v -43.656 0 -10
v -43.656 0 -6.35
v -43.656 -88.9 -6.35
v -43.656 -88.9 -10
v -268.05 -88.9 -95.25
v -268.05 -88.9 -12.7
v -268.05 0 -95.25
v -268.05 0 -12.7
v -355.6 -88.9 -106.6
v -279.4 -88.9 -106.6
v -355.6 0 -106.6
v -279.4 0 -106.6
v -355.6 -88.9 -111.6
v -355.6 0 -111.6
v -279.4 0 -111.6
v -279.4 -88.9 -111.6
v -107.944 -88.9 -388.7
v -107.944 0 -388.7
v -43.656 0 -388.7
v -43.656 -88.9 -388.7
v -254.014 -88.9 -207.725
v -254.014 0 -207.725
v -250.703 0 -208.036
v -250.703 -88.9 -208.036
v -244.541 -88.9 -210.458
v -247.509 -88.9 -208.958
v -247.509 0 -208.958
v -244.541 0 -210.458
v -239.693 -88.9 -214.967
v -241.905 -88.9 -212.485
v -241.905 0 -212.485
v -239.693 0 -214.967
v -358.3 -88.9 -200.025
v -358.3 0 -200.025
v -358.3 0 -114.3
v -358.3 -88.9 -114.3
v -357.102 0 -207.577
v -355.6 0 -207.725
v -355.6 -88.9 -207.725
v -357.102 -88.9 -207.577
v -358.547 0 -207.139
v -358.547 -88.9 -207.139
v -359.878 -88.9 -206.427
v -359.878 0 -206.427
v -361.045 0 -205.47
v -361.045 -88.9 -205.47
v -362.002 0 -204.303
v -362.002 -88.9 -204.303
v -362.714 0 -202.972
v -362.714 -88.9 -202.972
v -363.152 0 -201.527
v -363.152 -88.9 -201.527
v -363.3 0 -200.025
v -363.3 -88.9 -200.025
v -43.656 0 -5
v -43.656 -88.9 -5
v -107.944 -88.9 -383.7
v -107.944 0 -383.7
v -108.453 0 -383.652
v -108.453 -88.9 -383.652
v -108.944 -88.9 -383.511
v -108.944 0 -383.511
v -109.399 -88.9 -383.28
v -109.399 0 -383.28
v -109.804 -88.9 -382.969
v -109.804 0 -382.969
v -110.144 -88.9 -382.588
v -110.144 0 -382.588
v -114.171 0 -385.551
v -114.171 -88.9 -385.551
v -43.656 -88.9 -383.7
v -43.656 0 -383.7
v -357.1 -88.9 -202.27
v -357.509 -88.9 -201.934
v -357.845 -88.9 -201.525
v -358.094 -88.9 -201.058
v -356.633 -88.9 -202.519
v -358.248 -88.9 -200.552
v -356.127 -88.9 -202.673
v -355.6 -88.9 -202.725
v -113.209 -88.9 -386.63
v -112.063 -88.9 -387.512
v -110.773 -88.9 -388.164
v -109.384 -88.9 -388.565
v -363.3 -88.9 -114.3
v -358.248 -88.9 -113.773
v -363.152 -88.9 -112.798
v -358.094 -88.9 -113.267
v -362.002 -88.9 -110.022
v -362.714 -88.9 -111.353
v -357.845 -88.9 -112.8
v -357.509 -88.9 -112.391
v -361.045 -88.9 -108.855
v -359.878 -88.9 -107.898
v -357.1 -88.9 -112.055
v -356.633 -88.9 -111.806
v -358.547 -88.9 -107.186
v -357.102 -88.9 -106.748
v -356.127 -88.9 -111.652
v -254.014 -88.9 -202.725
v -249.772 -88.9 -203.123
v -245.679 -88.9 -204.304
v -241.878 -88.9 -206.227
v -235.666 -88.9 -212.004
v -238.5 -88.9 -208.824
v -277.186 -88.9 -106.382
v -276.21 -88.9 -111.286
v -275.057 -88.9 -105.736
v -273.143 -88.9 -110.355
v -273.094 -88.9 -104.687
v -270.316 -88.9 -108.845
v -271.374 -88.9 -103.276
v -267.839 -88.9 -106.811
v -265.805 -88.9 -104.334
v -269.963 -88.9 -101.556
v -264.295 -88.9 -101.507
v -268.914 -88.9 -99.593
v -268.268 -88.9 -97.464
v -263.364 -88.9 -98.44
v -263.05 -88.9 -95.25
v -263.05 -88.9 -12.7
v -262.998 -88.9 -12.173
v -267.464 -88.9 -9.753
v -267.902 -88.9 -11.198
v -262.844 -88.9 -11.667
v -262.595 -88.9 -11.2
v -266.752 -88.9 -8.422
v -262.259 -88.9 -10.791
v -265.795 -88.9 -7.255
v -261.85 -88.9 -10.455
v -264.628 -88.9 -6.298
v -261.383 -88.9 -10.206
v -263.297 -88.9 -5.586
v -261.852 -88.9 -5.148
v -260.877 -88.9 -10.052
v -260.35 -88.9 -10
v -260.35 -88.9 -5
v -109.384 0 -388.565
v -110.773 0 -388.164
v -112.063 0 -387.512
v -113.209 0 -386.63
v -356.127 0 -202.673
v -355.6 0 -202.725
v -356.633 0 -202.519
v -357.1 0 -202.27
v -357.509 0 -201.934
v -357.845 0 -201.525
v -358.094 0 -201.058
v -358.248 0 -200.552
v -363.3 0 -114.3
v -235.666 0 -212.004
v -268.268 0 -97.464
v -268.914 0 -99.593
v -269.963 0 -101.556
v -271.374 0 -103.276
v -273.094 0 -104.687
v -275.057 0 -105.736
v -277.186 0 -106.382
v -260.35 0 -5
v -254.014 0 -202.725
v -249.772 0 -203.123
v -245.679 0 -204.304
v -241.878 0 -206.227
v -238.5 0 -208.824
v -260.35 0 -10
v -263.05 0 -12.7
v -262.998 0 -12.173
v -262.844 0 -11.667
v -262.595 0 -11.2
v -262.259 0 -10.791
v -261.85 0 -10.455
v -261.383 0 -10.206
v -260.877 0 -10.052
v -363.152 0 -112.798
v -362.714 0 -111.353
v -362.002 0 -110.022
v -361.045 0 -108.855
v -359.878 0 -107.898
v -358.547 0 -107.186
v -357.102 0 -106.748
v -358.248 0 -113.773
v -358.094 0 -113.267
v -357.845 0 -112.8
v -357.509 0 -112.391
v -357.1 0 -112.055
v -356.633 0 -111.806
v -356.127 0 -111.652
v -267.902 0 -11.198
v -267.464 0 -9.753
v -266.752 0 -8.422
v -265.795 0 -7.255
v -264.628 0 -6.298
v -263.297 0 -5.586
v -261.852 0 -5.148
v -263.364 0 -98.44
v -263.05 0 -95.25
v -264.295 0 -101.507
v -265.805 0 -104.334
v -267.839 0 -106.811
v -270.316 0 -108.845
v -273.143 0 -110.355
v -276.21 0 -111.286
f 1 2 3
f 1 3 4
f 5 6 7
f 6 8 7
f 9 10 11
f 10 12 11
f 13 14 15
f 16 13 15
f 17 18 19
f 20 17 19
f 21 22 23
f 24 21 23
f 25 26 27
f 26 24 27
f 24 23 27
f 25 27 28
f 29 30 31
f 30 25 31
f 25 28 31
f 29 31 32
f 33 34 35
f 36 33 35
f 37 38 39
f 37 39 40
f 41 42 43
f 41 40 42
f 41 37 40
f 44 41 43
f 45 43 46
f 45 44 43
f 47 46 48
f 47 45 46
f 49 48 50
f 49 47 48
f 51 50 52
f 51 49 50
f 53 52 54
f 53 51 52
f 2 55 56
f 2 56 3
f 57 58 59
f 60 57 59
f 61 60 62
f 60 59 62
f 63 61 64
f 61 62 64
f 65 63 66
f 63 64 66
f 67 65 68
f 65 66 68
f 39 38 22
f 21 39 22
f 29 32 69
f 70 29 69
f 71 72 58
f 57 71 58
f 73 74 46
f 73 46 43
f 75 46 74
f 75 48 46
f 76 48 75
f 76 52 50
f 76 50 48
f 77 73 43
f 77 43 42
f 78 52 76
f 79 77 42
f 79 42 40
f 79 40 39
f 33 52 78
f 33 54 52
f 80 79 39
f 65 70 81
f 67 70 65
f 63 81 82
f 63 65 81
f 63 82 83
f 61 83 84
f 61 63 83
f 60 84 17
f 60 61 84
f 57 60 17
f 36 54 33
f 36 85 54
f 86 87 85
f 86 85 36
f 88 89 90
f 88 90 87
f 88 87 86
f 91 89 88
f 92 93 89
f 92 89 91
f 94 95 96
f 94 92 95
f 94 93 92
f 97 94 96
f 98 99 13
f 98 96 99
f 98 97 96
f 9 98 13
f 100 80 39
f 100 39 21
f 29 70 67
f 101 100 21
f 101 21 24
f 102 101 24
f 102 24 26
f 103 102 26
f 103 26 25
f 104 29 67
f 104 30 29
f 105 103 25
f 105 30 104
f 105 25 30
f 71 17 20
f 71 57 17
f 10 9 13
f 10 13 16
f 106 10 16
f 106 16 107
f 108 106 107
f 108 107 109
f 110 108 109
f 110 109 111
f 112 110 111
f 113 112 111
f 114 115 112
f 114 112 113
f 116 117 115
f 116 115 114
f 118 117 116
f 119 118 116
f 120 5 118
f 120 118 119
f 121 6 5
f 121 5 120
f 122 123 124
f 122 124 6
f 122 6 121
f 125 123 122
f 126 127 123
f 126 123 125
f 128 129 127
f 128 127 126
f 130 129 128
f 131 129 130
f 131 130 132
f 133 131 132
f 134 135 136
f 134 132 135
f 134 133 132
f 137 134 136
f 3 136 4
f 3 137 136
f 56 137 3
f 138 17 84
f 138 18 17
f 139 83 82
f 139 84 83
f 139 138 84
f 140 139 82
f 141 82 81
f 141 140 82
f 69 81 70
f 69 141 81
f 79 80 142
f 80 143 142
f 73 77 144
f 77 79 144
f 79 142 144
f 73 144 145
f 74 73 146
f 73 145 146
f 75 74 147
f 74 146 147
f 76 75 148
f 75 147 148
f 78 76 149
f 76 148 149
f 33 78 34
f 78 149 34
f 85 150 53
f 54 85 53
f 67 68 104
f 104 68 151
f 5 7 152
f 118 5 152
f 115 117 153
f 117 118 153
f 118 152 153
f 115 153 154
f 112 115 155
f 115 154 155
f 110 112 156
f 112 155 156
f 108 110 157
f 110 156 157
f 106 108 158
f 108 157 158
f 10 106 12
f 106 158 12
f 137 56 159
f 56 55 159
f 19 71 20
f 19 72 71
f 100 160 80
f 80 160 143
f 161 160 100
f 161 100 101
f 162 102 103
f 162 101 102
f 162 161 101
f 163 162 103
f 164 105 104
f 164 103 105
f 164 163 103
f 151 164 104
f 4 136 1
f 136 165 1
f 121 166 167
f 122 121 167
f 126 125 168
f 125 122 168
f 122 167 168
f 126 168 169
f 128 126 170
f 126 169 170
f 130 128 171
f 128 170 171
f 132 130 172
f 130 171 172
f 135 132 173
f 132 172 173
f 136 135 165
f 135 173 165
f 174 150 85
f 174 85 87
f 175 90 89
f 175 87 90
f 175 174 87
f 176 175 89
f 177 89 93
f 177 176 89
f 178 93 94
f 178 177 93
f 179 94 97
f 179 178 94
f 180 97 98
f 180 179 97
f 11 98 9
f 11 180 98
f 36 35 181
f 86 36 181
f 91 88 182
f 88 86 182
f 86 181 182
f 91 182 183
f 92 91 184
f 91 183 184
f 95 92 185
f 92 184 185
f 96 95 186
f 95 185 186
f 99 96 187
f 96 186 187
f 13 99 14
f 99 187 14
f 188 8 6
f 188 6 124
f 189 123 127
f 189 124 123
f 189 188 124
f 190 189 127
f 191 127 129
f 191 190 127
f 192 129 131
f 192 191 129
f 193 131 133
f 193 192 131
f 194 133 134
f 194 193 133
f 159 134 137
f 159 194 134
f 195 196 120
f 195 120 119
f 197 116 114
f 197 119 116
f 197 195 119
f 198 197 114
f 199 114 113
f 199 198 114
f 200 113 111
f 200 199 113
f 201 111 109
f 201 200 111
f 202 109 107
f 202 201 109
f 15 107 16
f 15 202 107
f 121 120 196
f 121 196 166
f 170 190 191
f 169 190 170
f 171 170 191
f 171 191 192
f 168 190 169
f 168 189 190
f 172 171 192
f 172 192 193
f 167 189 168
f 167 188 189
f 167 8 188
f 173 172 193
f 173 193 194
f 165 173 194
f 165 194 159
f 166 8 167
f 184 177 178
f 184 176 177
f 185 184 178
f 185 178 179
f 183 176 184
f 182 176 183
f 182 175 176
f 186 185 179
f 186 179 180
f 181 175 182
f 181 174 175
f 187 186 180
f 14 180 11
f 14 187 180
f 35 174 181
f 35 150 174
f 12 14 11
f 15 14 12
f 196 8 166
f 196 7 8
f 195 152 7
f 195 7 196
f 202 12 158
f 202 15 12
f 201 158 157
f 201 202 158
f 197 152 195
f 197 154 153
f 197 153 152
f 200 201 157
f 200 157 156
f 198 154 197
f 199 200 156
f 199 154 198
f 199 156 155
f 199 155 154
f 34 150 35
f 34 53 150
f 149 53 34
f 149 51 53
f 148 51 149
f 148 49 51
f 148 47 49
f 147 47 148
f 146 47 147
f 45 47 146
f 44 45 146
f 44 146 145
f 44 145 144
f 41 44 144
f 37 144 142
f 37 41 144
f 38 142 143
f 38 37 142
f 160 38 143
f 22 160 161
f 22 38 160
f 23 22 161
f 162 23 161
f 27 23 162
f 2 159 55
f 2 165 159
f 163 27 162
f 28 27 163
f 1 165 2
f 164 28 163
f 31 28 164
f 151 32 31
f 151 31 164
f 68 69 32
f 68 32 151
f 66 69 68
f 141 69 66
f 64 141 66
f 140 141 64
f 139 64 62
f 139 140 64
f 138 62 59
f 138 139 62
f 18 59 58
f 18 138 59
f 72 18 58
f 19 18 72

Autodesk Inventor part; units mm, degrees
ref_plane "YZ Plane" through (0, 0, 0) normal (1, 0, 0) x (0, 1, 0)
ref_plane "XZ Plane" through (0, 0, 0) normal (0, 1, 0) x (-1, 0, 0)
ref_plane "XY Plane" through (0, 0, 0) normal (0, 0, 1) x (1, 0, 0)
sketch "Boceto1" plane through (0, 0, 0) normal (0, 1, 0) x (-1, 0, 0)
  line L0 (0, 0) -> (273.05, 0)
  line L1 (273.05, 0) -> (273.05, -101.6)
  line L2 (273.05, -101.6) -> (368.3, -101.6)
  line L3 (368.3, -101.6) -> (368.3, -212.725)
  line L4 (0, 0) -> (0, -393.7)
  line L5 (0, -393.7) -> (114.3, -393.7)
  line L6 (368.3, -212.725) -> (247.65, -212.725)
  line L7 (247.65, -212.725) -> (114.3, -393.7)
  dimension "d0" = 273.05
  dimension "d1" = 101.6
  dimension "d2" = 95.25
  dimension "d3" = 111.125
  dimension "d4" = 393.7
  dimension "d50" = 114.3
  dimension "d51" = 133.35
extrude "Extrusión1" add sketch "Boceto1" along normal blind 5
fillet "Empalme1" radius 12.7 7 edges at (-368.3, 2.5, -101.6) (-273.05, 2.5, 0) (-368.3, 2.5, -212.725) (-247.65, 2.5, -212.725) (-114.3, 2.5, -393.7) (0, 2.5, -393.7) (0, 2.5, 0)
fillet "Empalme2" radius 6.35 1 edges at (-273.05, 2.5, -101.6)
sketch "Boceto2" plane through (0, 5, 0) normal (0, 1, 0) x (1, 0, 0)
  line L0 (-349.25, 119.0625) -> (-273.05, 119.0625)
  line L1 (-273.05, 119.0625) -> (-273.05, 195.2625)
  line L2 (-273.05, 195.2625) -> (-349.25, 195.2625)
  line L3 (-349.25, 195.2625) -> (-349.25, 119.0625)
  line L4 (-368.3, 200.025) -> (-368.3, 114.3) projected
  line L5 (-254.0674, 212.725) -> (-355.6, 212.725) projected
  line L6 (-355.6, 101.6) -> (-279.4, 101.6) projected
  line L7 (-260.35, 0) -> (-12.7, 0) projected
  line L8 (-43.6563, 0) -> (-38.1, 0)
  line L9 (-38.1, 0) -> (-38.1, 6.35)
  line L10 (-38.1, 6.35) -> (-43.6562, 6.35)
  line L11 (-43.6562, 6.35) -> (-43.6563, 0)
  line L12 (-12.7, 393.7) -> (-107.8826, 393.7) projected
  line L13 (0, 12.7) -> (0, 381) projected
  circle A0 centre (-98.0281, 104.775) radius 4.3656
  circle A1 centre (-59.9281, 104.775) radius 4.3656
  circle A2 centre (-98.0281, 288.925) radius 4.3656
  circle A3 centre (-59.9281, 288.925) radius 4.3656
  line L14 (-123.825, 158.75) -> (-47.625, 158.75)
  line L15 (-47.625, 158.75) -> (-47.625, 234.95)
  line L16 (-47.625, 234.95) -> (-123.825, 234.95)
  line L17 (-123.825, 234.95) -> (-123.825, 158.75)
  circle A4 centre (-42.6641, 365.125) radius 5
  circle A5 centre (-42.6641, 28.575) radius 5
  line L18 (-107.8826, 393.7) -> (-12.7, 393.7) projected
  line L19 (-43.6563, 393.7) -> (-38.1, 393.7)
  line L20 (-38.1, 393.7) -> (-38.1, 387.35)
  line L21 (-38.1, 387.35) -> (-43.6563, 387.35)
  line L22 (-43.6563, 387.35) -> (-43.6563, 393.7)
  line L23 (-42.8625, 127) -> (-38.1, 127)
  line L24 (-38.1, 127) -> (-38.1, 140.0969)
  line L25 (-38.1, 140.0969) -> (-42.8625, 140.0969)
  line L26 (-42.8625, 140.0969) -> (-42.8625, 127)
  line L27 (-42.8625, 190.5) -> (-38.1, 190.5)
  line L28 (-38.1, 190.5) -> (-38.1, 203.5969)
  line L29 (-38.1, 203.5969) -> (-42.8625, 203.5969)
  line L30 (-42.8625, 203.5969) -> (-42.8625, 190.5)
  line L31 (-42.8625, 254) -> (-38.1, 254)
  line L32 (-38.1, 254) -> (-38.1, 267.0969)
  line L33 (-38.1, 267.0969) -> (-42.8625, 267.0969)
  line L34 (-42.8625, 267.0969) -> (-42.8625, 254)
  point P0 (0, 0)
  dimension "d11" = 76.2
  dimension "d17" = 17.4625
  dimension "d18" = 19.05
  dimension "d19" = 76.2
  dimension "d20" = 5.5563
  dimension "d22" = 6.35
  dimension "d24" = 38.1
  dimension "d27" = 8.7312
  dimension "d38" = 76.2
  dimension "d39" = 76.2
  dimension "d40" = 158.75
  dimension "d42" = 10
  dimension "d43" = 28.575
  dimension "d44" = 42.6641
  dimension "d47" = 10
  dimension "d52" = 38.1
  dimension "d53" = 5.5563
  dimension "d54" = 6.35
  dimension "d55" = 47.625
  dimension "d56" = 8.7312
  dimension "d57" = 98.0281
  dimension "d58" = 38.1
  dimension "d59" = 53.975
  dimension "d60" = 53.975
  dimension "d61" = 184.15
  dimension "d62" = 184.15
  dimension "d63" = 38.1
  dimension "d64" = 8.7312
  dimension "d65" = 8.7312
  dimension "d66" = 98.0281
  dimension "d67" = 42.6641
  dimension "d68" = 28.575
  dimension "d69" = 4.7625
  dimension "d70" = 4.7625
  dimension "d71" = 4.7625
  dimension "d72" = 13.0969
  dimension "d73" = 13.0969
  dimension "d74" = 13.0969
  dimension "d75" = 38.1
  dimension "d80" = 63.5
  dimension "d81" = 63.5
  dimension "d82" = 127
extrude "Extrusión2" cut sketch "Boceto2" against normal up to next
fillet "Empalme3" radius 3.5719 8 edges at (-349.25, 2.5, -119.0625) (-123.825, 2.5, -158.75) (-349.25, 2.5, -195.2625) (-123.825, 2.5, -234.95) (-273.05, 2.5, -195.2625) (-47.625, 2.5, -234.95) (-273.05, 2.5, -119.0625) (-47.625, 2.5, -158.75)
sketch "Boceto3" plane through (0, 5, 0) normal (0, 1, 0) x (1, 0, 0)
  line L0 (0, 12.7) -> (0, 381) projected
  line L1 (0, 381) -> (0, 12.7) projected
  line L2 (0, 196.85) -> (-12.7, 196.85)
  line L3 (0, 196.85) -> (0, 219.075)
  line L4 (0, 196.85) -> (0, 174.625)
  arc A0 (0, 219.075) -> (0, 174.625) centre (13.0969, 196.85) ccw
  point P0 (0, 0)
  dimension "d86" = 12.7
  dimension "d87" = 22.225
  dimension "d88" = 22.225
extrude "Extrusión3" cut sketch "Boceto3" against normal up to next
fillet "Empalme4" radius 4.7625 2 edges at (0, 2.5, -219.075) (0, 2.5, -174.625)
sketch "Boceto4" plane through (0, 0, 0) normal (0, -1, 0) x (1, 0, 0)
  line L0 (-43.6562, -5) -> (-260.35, -5)
  line L1 (-268.05, -12.7) -> (-268.05, -95.25)
  line L2 (-279.4, -106.6) -> (-355.6, -106.6)
  line L3 (-363.3, -114.3) -> (-363.3, -200.025)
  line L4 (-355.6, -207.725) -> (-254.0138, -207.725)
  line L5 (-239.693, -214.9673) -> (-114.1714, -385.5509)
  line L6 (-107.9443, -388.7) -> (-43.6563, -388.7)
  line L7 (-107.8826, -393.7) -> (-43.6563, -393.7) projected
  line L8 (-118.1068, -388.5336) -> (-243.8432, -217.8914) projected
  line L9 (-355.6, -212.725) -> (-254.0674, -212.725) projected
  line L10 (-368.3, -200.025) -> (-368.3, -114.3) projected
  line L11 (-43.6563, -387.35) -> (-43.6563, -393.7) projected
  line L12 (-355.6, -101.6) -> (-279.4, -101.6) projected
  line L13 (-273.05, -95.25) -> (-273.05, -12.7) projected
  line L14 (-260.35, 0) -> (-43.6563, 0) projected
  line L15 (-43.6563, 0) -> (-43.6562, -6.35) projected
  arc A0 (-363.3, -200.025) -> (-355.6, -207.725) centre (-355.6, -200.025) ccw
  line L16 (-368.3, -114.3) -> (-368.3, -200.025) projected
  arc A1 (-355.6, -106.6) -> (-363.3, -114.3) centre (-355.6, -114.3) ccw
  arc A2 (-260.35, -5) -> (-268.05, -12.7) centre (-260.35, -12.7) ccw
  arc A3 (-279.4, -106.6) -> (-268.05, -95.25) centre (-279.4, -95.25) ccw
  line L17 (-273.05, -12.7) -> (-273.05, -95.25) projected
  line L18 (-174.9103, -311.4431) -> (-170.8831, -308.4798)
  arc A4 (-239.693, -214.9673) -> (-254.0138, -207.725) centre (-254.0138, -225.505) ccw
  arc A5 (-114.1714, -385.5509) -> (-107.9443, -388.7) centre (-107.9443, -380.9688) ccw
  line L19 (-43.6563, -383.7) -> (-107.9443, -383.7)
  arc A6 (-110.1442, -382.5875) -> (-107.9443, -383.7) centre (-107.9443, -380.9688) ccw
  line L20 (-110.1442, -382.5875) -> (-235.6658, -212.0039)
  arc A7 (-235.6658, -212.0039) -> (-254.0138, -202.725) centre (-254.0138, -225.505) ccw
  line L21 (-254.0138, -202.725) -> (-355.6, -202.725)
  arc A8 (-358.3, -200.025) -> (-355.6, -202.725) centre (-355.6, -200.025) ccw
  line L22 (-358.3, -200.025) -> (-358.3, -114.3)
  arc A9 (-355.6, -111.6) -> (-358.3, -114.3) centre (-355.6, -114.3) ccw
  line L23 (-355.6, -111.6) -> (-279.4, -111.6)
  arc A10 (-279.4, -111.6) -> (-263.05, -95.25) centre (-279.4, -95.25) ccw
  line L24 (-263.05, -95.25) -> (-263.05, -12.7)
  arc A11 (-260.35, -10) -> (-263.05, -12.7) centre (-260.35, -12.7) ccw
  line L25 (-260.35, -10) -> (-43.6562, -10)
  line L26 (-43.6563, -383.7) -> (-43.6563, -388.7)
  line L27 (-43.6562, -5) -> (-43.6562, -10)
  line L28 (-43.6562, -6.35) -> (-43.6563, 0) projected
  point P0 (0, 0)
  dimension "d92" = 5
  dimension "d95" = 5
  dimension "d96" = 5
  dimension "d99" = 5
  dimension "d100" = 5
  dimension "d101" = 5
  dimension "d102" = 0
  dimension "d105" = 0
  dimension "d109" = 0
  dimension "d110" = 5
  dimension "d115" = 17.78
  dimension "d117" = 5
  dimension "d118" = 7.7312
extrude "Extrusión4" add sketch "Boceto4" along normal blind 88.9
sketch "Boceto5" plane through (0, 5, 0) normal (0, 1, 0) x (1, 0, 0)
  line L0 (88.3096, -76.4471) -> (-485.0439, -76.4471)
  line L1 (-485.0439, -76.4471) -> (-485.0439, 517.9952)
  line L2 (-485.0439, 517.9952) -> (88.3096, 517.9952)
  line L3 (88.3096, 517.9952) -> (88.3096, -76.4471)
  point P0 (0, 0)
extrude "Extrusión5" cut sketch "Boceto5" against normal up to surface (5 mm away)
equation "\"d42\" = UBD"
equation "\"d47\" = UBD"
equation "\"LM\" = 76.2"
equation "\"UBD\" = 10"
properties part number "CAR INTERNAL PLATE"
